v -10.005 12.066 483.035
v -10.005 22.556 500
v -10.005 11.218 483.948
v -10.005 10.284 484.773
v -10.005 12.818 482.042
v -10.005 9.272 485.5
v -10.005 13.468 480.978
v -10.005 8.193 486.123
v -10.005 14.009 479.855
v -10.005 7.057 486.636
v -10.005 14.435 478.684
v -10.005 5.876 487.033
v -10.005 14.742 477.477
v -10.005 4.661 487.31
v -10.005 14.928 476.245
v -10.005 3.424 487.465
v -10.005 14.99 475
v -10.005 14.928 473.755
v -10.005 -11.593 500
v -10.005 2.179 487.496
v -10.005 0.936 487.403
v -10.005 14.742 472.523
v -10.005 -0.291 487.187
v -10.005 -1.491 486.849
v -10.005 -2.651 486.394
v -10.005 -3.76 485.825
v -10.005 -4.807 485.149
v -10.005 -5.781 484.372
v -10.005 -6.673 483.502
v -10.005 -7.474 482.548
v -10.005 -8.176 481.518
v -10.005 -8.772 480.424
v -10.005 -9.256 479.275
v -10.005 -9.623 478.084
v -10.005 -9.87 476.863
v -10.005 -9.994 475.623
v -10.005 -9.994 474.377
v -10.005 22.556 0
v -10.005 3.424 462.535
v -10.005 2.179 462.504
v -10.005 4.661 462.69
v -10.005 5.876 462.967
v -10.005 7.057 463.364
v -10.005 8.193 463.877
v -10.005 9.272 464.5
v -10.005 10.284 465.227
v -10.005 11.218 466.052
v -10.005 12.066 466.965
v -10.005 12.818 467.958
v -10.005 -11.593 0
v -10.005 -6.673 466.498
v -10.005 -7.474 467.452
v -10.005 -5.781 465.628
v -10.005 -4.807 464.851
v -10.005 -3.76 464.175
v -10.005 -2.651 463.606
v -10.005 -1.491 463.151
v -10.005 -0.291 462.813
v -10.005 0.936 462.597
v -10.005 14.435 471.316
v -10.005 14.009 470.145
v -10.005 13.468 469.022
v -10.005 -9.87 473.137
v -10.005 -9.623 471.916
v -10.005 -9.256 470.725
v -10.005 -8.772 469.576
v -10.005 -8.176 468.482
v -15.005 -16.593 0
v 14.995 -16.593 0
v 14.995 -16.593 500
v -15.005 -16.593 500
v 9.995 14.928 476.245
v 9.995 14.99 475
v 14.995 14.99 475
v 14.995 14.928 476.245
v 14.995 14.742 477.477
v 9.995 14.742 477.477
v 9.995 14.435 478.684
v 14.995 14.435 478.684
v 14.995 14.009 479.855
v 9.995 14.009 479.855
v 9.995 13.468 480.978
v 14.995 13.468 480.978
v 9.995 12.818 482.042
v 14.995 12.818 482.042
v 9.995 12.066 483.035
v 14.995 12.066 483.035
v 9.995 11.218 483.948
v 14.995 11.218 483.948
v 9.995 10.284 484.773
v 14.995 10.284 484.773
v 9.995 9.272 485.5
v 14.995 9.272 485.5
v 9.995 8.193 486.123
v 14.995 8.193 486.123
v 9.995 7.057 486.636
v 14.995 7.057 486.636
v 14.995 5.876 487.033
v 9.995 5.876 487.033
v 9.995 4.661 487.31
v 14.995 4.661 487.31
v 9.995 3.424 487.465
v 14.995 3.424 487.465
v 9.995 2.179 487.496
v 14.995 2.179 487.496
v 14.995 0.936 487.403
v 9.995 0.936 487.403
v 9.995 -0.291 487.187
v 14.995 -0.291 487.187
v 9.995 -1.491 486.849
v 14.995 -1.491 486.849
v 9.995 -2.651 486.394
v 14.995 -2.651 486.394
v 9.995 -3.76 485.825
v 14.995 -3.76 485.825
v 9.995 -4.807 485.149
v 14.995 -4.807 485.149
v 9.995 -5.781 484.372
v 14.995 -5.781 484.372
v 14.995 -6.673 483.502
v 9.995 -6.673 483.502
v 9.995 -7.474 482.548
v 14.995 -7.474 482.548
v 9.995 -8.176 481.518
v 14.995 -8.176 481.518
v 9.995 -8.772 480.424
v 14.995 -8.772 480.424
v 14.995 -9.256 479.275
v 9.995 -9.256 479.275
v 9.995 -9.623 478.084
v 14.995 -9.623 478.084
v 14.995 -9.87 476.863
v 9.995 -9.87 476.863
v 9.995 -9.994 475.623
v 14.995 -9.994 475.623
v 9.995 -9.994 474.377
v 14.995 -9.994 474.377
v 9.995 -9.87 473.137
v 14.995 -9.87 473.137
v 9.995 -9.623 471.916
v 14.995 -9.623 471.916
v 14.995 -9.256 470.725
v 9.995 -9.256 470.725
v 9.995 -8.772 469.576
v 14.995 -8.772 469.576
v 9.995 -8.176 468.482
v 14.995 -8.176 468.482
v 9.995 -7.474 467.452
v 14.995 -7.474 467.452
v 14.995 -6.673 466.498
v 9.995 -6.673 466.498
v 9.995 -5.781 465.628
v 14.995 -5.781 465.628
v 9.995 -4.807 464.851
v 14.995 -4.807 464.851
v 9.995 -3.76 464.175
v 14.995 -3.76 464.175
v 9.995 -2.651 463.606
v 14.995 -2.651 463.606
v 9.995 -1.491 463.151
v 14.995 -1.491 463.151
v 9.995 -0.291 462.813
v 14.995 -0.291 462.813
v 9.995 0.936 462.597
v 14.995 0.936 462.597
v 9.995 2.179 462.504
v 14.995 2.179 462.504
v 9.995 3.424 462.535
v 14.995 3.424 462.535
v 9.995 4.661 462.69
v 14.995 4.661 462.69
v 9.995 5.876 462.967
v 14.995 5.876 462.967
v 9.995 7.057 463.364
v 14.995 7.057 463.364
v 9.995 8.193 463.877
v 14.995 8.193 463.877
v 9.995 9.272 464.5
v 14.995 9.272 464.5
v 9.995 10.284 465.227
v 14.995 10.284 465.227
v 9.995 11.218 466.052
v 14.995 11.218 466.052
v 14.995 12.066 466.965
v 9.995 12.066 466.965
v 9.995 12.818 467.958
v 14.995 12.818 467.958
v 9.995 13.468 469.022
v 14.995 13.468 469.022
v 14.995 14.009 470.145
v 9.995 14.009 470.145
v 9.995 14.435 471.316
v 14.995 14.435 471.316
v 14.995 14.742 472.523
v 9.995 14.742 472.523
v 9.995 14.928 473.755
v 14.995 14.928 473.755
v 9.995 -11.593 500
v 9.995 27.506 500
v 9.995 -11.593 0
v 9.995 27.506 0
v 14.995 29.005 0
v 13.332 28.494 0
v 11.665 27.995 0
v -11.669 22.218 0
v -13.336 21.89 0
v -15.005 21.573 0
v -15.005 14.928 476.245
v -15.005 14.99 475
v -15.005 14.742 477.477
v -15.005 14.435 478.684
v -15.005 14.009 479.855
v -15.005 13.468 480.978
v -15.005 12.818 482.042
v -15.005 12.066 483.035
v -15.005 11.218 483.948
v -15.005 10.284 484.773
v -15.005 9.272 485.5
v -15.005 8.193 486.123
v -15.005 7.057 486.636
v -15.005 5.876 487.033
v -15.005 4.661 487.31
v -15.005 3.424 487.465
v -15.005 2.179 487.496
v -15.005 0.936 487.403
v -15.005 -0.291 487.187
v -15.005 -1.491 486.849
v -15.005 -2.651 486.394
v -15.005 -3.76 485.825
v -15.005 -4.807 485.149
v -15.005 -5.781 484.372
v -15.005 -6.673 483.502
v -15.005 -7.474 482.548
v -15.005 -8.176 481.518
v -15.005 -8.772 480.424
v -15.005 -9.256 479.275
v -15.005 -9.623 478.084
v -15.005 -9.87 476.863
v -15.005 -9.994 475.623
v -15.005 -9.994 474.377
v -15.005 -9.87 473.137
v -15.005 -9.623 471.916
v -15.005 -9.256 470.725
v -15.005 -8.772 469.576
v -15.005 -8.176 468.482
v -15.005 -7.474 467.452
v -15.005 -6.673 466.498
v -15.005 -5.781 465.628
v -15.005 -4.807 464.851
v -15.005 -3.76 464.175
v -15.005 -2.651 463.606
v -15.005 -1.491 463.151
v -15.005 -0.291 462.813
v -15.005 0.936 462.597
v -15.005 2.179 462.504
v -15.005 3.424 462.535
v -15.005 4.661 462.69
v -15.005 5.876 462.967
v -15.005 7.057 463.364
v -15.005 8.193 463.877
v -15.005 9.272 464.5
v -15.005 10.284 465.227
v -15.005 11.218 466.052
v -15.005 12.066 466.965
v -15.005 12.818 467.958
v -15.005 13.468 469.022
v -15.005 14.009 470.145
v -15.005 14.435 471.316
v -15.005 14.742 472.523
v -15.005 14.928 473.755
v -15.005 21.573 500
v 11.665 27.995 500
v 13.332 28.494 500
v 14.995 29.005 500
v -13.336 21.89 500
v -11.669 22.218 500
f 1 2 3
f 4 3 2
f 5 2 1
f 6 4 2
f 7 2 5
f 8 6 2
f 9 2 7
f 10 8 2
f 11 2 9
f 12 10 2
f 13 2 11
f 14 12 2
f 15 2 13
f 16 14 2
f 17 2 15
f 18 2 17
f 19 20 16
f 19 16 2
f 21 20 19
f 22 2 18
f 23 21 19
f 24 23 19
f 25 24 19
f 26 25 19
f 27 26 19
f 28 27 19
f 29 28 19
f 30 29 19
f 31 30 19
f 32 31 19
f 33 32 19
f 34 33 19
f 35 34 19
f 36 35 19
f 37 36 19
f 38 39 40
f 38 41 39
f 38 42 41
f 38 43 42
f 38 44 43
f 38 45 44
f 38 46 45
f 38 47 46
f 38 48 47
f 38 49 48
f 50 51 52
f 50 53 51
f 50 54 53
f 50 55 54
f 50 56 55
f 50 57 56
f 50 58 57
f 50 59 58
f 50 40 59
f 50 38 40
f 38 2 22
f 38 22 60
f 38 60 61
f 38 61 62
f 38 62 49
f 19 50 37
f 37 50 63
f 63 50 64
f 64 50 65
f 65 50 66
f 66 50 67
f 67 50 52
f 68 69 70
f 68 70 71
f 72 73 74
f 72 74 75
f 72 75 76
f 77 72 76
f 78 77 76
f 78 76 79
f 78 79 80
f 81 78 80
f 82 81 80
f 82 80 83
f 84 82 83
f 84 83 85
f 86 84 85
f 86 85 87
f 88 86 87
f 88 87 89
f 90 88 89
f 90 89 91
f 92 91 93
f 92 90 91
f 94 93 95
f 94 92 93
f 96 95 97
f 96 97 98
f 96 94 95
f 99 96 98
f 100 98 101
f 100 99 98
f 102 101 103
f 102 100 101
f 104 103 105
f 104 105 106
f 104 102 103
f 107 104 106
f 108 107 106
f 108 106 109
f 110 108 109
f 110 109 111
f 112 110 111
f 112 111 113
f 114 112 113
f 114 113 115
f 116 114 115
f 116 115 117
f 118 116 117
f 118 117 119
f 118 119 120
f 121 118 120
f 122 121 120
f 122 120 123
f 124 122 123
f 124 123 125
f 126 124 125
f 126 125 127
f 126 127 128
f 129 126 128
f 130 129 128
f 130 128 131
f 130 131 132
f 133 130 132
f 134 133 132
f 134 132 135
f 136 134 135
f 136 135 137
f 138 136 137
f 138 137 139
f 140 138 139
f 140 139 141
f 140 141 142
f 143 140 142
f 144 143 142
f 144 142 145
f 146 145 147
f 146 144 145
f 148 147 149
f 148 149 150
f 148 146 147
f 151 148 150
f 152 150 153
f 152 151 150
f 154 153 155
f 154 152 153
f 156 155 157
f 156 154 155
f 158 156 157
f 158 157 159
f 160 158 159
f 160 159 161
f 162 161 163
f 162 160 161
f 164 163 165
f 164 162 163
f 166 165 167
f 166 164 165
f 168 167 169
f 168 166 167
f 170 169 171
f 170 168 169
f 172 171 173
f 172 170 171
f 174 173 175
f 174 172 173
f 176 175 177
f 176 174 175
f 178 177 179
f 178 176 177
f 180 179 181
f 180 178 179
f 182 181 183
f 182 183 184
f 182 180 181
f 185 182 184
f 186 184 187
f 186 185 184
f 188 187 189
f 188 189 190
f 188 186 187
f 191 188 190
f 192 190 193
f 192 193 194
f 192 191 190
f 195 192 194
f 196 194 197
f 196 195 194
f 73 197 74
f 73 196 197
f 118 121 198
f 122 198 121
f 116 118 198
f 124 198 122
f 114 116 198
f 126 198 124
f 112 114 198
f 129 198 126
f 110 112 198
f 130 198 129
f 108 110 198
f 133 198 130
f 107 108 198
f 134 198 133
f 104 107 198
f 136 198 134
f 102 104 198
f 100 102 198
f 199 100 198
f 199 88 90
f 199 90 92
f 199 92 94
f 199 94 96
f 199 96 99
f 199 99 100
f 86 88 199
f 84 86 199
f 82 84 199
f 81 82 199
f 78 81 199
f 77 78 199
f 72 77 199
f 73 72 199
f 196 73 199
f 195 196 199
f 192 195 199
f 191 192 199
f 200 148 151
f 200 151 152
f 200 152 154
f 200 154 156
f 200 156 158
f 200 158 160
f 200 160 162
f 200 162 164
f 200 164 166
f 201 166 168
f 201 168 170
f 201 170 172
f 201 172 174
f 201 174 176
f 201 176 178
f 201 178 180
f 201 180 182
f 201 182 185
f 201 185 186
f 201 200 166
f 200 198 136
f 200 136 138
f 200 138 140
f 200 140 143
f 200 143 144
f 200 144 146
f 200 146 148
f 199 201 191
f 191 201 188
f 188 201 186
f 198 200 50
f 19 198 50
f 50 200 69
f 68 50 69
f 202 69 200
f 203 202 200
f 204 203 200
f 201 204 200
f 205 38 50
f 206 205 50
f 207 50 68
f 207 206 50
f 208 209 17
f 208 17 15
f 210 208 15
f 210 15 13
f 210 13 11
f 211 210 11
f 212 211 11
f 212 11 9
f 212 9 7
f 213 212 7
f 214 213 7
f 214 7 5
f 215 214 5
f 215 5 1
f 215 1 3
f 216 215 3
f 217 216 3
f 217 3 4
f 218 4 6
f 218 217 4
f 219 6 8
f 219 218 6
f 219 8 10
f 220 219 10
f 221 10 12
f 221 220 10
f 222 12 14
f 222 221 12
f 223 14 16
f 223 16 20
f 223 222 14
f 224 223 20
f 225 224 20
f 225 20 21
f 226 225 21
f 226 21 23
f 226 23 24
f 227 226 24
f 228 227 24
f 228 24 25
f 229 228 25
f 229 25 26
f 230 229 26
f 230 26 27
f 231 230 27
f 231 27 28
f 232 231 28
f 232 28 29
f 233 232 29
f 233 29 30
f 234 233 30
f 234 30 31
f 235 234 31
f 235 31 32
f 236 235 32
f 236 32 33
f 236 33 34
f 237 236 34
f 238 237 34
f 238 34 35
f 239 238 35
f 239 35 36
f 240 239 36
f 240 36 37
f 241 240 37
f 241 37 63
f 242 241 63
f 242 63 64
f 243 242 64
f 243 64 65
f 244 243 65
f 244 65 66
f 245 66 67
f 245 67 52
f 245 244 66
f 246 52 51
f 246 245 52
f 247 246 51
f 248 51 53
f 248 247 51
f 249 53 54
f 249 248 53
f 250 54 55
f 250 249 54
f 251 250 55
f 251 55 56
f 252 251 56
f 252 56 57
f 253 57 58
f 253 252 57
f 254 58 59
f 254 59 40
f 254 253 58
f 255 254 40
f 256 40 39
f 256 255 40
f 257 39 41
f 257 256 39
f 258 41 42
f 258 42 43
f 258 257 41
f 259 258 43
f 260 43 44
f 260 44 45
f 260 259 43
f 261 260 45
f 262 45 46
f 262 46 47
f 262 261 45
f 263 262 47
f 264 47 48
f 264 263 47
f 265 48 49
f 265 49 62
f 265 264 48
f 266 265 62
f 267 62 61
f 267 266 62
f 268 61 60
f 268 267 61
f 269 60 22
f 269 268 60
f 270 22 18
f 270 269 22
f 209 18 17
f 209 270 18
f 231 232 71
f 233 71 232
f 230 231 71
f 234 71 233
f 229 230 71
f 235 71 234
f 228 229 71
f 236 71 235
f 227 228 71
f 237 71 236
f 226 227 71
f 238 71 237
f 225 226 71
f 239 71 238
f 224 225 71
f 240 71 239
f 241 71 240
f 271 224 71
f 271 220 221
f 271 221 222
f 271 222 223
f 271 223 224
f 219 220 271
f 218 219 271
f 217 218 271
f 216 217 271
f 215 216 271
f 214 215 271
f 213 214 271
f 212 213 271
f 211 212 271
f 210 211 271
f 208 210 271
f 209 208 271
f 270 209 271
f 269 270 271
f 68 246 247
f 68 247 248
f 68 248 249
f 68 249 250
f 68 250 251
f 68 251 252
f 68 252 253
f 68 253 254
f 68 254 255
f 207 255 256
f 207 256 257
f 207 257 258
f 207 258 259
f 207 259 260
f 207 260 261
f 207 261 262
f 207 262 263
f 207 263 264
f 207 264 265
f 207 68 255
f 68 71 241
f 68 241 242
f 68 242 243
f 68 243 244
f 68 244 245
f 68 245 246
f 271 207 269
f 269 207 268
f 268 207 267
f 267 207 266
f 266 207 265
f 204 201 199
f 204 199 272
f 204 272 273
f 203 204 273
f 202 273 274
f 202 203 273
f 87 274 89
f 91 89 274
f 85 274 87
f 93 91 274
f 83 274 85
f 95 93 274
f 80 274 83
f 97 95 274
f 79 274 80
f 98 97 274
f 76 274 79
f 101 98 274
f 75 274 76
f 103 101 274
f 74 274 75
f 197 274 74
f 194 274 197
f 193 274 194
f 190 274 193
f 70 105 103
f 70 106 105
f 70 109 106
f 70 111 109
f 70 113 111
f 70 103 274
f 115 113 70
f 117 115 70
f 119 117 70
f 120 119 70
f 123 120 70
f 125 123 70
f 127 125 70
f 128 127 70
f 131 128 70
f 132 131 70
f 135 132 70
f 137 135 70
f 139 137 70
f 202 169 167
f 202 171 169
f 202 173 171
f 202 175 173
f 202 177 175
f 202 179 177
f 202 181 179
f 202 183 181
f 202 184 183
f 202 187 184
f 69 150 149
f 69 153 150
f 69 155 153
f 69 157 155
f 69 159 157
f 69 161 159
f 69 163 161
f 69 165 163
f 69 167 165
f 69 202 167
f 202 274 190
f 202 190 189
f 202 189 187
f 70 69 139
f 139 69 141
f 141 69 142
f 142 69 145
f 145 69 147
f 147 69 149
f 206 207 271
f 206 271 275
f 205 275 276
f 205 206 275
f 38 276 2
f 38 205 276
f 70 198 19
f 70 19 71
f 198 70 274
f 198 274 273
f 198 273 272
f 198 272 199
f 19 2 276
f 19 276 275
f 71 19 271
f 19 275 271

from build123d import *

# Parameters (mm, degrees)
F0_W     = 20
F0_H     = 5
F1_DEPTH = 500
F2_R     = 12.5
F3_DEPTH = 50


with BuildPart() as f1:
    # F0 (on Top) → F1 (new body)
    with BuildSketch(Plane.XY):
        with BuildLine():
            Line((-9.995486, -11.592771), (-9.995486, 27.50601))
            ThreePointArc((-9.995486, 27.50601), (-12.499174, 28.243273), (-14.995486, 29.005138))
            Line((-14.995486, 29.005138), (-14.995486, -16.592771))
            Line((-14.995486, -16.592771), (-9.995486, -16.592771))
            Line((-9.995486, -16.592771), (-9.995486, -11.592771))
        make_face()
        with Locations((0.004514, -14.092771)):
            Rectangle(F0_W, F0_H)
        with BuildLine():
            Line((15.004514, -16.592771), (15.004514, 21.573286))
            ThreePointArc((15.004514, 21.573286), (12.502153, 22.05284), (10.004514, 22.55641))
            Line((10.004514, 22.55641), (10.004514, -11.592771))
            Line((10.004514, -11.592771), (10.004514, -16.592771))
            Line((10.004514, -16.592771), (15.004514, -16.592771))
        make_face()
    extrude(amount=F1_DEPTH)

    # F2 (on face) → F3 (cut)
    with BuildSketch(Plane.YZ.offset(15.004514)):
        with Locations((2.490257, 475)):
            Circle(F2_R)
    extrude(amount=-F3_DEPTH, mode=Mode.SUBTRACT)


with BuildPart() as f4_1:
    # F4: instance of F1
    add(f1.part.mirror(Plane.YZ))


solid = f4_1.part
